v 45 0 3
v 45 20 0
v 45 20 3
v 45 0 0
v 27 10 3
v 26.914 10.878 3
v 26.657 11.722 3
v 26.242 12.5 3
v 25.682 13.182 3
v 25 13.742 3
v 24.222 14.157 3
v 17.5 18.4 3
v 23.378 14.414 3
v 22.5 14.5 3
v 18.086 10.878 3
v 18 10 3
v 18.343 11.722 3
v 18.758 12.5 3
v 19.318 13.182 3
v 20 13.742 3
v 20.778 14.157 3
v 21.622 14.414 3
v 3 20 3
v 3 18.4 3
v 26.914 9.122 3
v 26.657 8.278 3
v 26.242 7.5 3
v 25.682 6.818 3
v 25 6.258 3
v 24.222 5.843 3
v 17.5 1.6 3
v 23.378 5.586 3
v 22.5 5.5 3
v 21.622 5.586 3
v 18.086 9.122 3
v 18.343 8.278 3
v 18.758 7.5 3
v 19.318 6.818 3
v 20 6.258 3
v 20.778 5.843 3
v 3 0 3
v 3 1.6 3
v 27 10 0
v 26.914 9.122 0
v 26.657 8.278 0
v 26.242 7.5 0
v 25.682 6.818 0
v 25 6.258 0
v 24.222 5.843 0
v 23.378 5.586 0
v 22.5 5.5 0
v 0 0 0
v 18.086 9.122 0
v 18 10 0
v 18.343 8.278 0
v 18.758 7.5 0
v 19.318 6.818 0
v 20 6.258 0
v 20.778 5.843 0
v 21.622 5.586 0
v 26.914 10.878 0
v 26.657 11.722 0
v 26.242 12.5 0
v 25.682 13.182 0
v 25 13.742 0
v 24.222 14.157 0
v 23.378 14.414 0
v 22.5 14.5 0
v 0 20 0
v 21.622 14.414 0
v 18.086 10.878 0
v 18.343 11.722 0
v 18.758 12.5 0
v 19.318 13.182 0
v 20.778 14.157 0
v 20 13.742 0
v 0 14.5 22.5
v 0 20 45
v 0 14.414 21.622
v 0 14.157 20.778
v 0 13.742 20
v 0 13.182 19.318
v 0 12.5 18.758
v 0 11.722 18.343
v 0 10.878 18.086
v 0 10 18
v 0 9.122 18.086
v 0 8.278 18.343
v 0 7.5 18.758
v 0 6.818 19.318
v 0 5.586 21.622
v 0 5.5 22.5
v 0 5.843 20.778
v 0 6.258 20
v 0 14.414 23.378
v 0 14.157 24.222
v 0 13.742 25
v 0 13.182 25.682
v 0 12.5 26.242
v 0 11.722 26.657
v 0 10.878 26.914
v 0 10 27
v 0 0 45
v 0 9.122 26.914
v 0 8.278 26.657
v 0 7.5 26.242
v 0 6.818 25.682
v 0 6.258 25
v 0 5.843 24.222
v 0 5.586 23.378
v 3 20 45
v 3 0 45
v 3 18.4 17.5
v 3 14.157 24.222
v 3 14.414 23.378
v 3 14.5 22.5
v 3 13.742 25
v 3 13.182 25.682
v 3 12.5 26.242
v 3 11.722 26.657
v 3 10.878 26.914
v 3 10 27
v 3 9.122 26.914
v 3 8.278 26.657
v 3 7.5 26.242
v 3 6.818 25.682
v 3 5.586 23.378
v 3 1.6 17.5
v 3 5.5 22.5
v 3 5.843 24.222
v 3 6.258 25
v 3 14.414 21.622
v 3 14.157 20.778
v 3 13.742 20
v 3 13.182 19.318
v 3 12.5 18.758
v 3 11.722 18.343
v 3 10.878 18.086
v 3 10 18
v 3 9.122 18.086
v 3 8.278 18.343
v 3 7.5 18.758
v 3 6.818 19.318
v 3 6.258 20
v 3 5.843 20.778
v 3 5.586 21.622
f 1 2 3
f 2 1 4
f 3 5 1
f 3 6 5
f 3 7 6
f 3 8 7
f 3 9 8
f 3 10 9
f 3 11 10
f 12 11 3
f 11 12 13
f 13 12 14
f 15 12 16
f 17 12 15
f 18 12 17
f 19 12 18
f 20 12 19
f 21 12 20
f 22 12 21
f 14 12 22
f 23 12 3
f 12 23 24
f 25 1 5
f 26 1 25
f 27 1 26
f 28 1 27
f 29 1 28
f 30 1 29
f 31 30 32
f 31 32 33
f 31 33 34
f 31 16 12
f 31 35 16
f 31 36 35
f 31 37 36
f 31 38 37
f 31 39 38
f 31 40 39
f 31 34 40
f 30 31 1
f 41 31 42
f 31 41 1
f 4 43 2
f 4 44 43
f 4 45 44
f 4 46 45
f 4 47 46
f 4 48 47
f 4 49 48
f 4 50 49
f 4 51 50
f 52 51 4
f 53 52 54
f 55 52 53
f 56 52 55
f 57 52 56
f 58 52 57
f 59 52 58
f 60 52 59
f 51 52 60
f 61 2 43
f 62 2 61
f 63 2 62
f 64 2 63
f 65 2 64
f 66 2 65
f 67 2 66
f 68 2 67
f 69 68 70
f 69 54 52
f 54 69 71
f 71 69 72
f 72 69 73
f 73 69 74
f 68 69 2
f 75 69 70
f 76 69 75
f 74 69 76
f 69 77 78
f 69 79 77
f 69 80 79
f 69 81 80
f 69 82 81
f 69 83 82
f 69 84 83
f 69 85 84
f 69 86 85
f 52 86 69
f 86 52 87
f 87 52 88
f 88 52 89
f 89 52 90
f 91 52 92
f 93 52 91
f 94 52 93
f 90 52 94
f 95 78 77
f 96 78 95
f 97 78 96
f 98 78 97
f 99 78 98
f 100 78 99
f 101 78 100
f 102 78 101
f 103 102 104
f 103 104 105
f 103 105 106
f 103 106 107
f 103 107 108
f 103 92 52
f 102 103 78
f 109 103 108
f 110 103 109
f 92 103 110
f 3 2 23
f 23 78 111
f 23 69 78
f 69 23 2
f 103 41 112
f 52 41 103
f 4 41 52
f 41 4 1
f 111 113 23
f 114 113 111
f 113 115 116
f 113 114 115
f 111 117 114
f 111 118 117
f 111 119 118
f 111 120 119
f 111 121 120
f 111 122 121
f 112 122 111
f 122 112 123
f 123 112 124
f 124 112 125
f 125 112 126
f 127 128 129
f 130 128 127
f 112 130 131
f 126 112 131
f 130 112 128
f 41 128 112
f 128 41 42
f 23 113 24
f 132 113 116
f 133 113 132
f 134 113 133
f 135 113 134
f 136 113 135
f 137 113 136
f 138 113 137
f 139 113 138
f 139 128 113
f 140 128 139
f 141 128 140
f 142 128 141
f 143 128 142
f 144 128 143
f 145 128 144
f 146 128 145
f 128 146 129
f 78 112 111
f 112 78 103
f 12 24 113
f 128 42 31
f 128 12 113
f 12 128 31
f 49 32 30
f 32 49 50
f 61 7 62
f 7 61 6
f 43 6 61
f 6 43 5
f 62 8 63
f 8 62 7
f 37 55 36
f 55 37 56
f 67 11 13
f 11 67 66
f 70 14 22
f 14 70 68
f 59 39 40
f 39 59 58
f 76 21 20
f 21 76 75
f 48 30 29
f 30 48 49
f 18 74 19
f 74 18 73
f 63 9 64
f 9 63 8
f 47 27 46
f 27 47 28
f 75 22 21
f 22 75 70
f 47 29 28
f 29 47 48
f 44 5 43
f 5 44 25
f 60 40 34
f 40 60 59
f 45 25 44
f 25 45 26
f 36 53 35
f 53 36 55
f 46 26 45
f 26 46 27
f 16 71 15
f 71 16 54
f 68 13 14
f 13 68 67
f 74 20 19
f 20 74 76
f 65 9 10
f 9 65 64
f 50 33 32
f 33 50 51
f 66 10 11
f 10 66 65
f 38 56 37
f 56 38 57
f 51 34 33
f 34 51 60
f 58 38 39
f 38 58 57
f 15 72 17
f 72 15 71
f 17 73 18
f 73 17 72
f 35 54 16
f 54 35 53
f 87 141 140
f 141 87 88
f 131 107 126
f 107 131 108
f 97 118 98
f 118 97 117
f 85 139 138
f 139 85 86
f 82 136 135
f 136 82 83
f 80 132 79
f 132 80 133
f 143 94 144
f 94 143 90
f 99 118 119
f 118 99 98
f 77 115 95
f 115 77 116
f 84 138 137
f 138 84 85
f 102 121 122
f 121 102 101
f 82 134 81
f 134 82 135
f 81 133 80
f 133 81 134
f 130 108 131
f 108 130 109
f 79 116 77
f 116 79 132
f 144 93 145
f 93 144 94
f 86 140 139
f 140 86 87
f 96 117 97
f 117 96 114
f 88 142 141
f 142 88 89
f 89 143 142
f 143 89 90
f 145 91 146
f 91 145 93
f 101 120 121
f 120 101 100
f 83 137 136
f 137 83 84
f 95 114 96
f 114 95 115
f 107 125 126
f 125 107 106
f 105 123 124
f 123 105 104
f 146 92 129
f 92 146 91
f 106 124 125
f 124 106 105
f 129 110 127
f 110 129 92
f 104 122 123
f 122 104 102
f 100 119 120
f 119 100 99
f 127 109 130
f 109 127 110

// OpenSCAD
$fn = 32;

// ----------------------------------------------------------------------
// L-bracket: 45 x 20 x 45 mm
// ----------------------------------------------------------------------

// --- parameters (mm) ---
base_len = 45;            // horizontal leg, X
upright_h = 45;           // vertical leg, Z
flange_w = 20;            // bracket depth, Y
mat_t = 3;                // plate thickness
hole_d = 9;               // clearance for M8
rib_leg = 18.9;           // gusset leg
rib_sink = 1.6;           // gusset overlap into the plates

module hole_z(px, py) {
  translate([px, py, -2.5]) cylinder(h = mat_t + 5, d = hole_d);
}
module hole_x(pz, py) {
  translate([-2.5, py, pz]) rotate([0, 90, 0]) cylinder(h = mat_t + 5, d = hole_d);
}
module gusset() {
  translate([0, flange_w - rib_sink, 0])
    rotate([90, 0, 0])
      linear_extrude(height = flange_w - 2 * rib_sink)
        polygon(points = [[rib_sink, rib_sink], [rib_leg, rib_sink], [rib_sink, rib_leg]]);
}

difference() {
  union() {
    /* horizontal leg */
    cube([base_len, flange_w, mat_t]);
    /* vertical leg, overlapping the corner block */
    cube([mat_t, flange_w, upright_h]);
    gusset();
  }
  hole_z(22.5, 10);
  hole_x(22.5, 10);
}
